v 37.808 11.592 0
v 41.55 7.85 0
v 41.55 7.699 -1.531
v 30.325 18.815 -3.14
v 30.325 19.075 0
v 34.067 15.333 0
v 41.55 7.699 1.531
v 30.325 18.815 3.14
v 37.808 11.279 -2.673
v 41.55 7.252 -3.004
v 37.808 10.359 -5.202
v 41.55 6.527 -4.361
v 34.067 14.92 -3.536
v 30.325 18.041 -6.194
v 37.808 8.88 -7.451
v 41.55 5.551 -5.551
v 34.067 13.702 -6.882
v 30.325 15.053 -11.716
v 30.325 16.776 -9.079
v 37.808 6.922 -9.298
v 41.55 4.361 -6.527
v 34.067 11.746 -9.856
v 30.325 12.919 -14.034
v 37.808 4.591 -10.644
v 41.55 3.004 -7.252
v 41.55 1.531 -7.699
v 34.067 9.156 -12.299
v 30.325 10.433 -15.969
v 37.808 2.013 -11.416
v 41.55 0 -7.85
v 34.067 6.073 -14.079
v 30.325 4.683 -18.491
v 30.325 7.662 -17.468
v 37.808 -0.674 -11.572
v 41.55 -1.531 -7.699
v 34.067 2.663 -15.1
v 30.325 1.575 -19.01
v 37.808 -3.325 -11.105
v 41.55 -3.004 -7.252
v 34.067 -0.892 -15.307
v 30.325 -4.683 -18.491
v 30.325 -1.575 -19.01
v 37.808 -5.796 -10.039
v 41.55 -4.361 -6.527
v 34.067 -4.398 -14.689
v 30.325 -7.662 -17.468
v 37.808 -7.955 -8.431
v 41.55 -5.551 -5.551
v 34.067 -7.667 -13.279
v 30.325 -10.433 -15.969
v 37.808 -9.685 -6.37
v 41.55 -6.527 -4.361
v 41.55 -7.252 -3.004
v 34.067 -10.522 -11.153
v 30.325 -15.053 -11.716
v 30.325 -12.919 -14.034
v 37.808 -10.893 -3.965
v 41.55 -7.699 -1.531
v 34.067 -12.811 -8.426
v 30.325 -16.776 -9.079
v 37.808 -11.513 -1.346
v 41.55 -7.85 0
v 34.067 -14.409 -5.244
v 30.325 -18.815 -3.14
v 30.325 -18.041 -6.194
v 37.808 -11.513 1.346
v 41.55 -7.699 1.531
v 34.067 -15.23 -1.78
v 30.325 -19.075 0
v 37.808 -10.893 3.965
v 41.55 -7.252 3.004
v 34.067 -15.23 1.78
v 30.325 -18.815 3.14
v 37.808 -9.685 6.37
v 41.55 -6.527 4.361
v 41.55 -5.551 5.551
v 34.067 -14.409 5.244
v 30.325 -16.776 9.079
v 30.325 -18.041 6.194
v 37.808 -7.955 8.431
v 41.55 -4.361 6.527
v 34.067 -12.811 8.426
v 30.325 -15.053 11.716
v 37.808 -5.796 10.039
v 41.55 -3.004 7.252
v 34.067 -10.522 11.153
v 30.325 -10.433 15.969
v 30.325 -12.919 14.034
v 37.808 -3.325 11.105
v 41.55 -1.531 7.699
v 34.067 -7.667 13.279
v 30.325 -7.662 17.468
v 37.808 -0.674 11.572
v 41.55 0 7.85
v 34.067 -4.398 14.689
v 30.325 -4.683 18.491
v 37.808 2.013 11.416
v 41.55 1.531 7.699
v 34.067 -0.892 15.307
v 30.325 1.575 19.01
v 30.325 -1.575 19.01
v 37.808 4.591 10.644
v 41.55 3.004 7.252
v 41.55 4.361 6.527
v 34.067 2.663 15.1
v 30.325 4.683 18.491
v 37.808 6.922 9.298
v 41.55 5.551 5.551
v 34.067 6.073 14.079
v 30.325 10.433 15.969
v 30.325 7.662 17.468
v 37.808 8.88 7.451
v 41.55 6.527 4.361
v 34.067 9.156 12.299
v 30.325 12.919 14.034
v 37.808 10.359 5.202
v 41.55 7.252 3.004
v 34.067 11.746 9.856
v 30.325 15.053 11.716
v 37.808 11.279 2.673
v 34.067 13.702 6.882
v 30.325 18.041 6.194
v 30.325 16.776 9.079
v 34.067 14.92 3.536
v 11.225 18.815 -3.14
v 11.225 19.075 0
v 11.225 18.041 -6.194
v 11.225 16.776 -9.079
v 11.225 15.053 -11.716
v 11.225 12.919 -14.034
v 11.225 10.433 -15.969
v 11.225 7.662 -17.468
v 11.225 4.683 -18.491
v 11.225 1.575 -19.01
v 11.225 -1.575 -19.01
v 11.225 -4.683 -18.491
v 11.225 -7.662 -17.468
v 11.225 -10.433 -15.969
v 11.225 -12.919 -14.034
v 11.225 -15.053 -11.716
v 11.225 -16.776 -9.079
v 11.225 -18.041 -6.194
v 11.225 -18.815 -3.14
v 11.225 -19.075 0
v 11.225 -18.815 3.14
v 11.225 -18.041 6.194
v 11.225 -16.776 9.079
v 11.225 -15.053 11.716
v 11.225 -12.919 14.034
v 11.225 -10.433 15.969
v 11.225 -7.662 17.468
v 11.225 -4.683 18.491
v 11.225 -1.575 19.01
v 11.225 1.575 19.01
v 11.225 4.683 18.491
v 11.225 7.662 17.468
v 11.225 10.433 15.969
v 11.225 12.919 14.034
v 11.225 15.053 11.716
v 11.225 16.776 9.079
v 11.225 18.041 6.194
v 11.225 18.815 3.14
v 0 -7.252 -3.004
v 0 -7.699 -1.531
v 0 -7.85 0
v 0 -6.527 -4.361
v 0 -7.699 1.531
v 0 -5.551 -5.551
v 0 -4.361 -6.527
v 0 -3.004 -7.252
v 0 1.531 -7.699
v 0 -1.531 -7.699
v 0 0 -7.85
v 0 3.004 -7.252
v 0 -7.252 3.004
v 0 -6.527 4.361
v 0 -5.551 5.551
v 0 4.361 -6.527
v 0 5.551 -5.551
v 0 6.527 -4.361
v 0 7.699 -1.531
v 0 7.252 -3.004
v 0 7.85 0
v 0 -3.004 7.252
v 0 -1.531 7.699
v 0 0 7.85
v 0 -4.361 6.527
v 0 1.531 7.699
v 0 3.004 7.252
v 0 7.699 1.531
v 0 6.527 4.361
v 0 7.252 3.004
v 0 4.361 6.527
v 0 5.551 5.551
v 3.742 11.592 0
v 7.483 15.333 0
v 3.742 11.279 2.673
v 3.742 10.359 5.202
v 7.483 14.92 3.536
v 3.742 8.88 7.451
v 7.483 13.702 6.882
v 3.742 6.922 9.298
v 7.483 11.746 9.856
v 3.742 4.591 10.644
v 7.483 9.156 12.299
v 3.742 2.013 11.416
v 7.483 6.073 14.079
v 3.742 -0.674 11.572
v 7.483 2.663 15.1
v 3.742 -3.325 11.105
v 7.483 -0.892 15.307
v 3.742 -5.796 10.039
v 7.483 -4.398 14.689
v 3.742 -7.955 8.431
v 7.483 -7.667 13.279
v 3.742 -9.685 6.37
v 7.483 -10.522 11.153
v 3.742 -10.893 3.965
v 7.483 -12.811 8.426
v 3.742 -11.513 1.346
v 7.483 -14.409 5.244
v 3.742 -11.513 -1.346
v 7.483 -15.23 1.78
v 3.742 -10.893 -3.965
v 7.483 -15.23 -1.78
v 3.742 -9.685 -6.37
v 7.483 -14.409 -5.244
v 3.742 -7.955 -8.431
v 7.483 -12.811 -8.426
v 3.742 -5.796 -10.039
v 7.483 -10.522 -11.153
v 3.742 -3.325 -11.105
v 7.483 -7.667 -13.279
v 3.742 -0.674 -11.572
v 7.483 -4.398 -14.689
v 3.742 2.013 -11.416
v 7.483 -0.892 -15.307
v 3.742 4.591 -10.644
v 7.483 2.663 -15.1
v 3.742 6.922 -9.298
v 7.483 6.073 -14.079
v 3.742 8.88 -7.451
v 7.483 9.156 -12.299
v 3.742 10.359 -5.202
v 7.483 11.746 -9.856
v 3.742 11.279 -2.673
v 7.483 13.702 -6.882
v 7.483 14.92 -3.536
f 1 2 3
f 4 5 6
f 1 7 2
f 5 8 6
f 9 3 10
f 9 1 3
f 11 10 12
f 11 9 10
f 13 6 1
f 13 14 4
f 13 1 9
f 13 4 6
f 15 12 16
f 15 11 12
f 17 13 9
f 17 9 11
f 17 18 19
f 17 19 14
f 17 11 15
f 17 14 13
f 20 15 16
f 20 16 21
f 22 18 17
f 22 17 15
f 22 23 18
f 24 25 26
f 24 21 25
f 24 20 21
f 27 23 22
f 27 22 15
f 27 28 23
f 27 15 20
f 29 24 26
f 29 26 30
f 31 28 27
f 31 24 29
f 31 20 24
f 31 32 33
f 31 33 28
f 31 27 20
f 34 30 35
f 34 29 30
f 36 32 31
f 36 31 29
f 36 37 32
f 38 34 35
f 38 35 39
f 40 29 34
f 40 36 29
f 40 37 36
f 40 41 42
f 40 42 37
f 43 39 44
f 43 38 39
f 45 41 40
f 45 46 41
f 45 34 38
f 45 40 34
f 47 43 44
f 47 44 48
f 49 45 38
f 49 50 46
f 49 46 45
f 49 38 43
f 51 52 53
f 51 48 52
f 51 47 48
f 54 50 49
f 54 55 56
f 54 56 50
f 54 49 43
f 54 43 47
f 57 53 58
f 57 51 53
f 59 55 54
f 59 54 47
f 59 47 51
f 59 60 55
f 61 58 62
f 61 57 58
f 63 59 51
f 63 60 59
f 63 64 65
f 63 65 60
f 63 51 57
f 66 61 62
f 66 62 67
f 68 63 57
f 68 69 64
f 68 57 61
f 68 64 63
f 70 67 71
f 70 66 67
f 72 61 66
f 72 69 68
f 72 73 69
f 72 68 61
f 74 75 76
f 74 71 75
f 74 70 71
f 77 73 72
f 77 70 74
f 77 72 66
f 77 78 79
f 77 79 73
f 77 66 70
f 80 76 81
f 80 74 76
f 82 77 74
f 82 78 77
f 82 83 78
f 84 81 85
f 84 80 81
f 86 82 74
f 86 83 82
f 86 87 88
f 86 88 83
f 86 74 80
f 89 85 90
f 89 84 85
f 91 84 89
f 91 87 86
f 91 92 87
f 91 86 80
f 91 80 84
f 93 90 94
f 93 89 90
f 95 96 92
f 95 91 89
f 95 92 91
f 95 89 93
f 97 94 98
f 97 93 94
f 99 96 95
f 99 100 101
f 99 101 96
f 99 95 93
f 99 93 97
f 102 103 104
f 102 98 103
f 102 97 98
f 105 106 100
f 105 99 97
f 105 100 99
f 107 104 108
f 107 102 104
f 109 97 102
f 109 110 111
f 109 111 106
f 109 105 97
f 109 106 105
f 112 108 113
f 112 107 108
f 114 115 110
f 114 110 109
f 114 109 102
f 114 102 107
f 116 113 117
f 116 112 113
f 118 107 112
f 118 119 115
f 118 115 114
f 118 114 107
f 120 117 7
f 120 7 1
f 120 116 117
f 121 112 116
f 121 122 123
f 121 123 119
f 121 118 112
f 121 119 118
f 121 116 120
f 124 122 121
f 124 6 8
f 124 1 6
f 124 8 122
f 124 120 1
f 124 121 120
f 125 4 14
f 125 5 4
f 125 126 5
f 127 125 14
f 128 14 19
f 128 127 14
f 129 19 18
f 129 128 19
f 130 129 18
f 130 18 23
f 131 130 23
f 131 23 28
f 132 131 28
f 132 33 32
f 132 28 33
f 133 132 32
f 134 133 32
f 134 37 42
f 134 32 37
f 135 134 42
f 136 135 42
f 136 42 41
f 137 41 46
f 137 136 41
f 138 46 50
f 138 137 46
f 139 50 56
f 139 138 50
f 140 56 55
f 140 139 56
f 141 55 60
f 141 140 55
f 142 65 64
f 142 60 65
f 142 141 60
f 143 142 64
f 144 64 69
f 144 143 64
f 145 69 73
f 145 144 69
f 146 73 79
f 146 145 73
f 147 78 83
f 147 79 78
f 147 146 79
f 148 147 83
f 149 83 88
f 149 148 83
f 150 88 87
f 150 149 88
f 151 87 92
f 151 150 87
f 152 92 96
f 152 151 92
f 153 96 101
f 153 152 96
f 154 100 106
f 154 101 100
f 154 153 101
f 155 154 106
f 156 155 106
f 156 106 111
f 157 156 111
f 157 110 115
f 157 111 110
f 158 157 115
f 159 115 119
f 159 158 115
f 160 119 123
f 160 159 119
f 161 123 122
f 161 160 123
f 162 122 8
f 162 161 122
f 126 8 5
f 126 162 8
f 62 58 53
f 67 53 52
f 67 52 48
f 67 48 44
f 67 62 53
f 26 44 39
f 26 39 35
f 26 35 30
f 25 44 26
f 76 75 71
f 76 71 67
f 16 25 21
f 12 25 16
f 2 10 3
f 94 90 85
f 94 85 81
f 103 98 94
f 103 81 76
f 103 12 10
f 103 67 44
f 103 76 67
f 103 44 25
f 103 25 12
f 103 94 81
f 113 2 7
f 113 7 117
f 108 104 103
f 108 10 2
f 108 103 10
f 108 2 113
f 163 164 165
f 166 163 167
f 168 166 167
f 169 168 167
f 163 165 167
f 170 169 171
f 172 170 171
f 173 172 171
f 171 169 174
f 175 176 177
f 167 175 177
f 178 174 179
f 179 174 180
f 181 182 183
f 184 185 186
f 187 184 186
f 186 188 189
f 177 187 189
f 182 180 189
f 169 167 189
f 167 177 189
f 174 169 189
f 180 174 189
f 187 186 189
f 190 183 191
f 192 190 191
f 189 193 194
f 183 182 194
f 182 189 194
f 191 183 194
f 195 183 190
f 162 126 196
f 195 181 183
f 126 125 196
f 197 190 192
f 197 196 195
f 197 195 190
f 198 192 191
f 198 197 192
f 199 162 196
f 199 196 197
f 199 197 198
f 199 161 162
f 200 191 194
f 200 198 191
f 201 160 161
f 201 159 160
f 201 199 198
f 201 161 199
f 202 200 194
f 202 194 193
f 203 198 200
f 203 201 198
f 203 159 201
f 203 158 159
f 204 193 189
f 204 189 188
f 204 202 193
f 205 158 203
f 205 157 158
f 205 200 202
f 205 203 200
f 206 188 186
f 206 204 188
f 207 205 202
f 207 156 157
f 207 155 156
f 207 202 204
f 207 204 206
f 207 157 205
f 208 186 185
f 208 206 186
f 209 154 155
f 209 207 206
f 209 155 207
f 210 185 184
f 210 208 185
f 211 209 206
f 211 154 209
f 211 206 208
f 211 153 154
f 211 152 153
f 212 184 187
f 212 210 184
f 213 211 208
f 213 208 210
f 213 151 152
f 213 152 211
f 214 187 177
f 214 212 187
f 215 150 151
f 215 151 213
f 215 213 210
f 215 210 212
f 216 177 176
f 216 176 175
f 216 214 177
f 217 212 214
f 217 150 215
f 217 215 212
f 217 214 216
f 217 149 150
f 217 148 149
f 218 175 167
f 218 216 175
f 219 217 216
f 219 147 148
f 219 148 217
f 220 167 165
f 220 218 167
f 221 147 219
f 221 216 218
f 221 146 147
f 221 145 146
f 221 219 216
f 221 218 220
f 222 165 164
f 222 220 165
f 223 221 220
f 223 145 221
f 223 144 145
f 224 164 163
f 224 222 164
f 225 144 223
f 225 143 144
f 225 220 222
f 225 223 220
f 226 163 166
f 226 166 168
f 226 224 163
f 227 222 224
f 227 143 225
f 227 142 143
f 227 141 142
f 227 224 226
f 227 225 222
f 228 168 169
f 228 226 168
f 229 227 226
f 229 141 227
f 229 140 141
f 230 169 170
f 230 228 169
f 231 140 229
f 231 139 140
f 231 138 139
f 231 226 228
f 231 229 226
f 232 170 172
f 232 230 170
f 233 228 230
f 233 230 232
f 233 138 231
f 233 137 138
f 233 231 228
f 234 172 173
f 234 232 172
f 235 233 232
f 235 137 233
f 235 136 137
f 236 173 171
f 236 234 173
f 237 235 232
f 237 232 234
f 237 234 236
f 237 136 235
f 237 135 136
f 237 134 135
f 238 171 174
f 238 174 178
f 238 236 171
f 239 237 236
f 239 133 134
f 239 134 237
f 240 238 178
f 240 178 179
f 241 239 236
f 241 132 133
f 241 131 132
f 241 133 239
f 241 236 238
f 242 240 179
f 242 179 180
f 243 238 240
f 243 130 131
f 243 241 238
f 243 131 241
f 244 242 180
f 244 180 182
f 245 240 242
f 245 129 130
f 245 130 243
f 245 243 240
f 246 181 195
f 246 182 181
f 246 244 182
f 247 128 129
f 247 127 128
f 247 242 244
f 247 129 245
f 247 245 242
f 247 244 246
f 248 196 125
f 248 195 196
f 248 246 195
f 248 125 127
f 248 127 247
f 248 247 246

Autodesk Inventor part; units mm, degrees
ref_plane "XZ Plane" through (0, 0, 0) normal (0, 1, 0) x (-1, 0, 0)
ref_plane "XY Plane" through (0, 0, 0) normal (0, 0, 1) x (1, 0, 0)
sketch "Boceto1" plane through (0, 0, 0) normal (1, 0, 0) x (0, 1, 0)
  circle A0 centre (0, 0) radius 7.85
  dimension "d0" = 15.7
ref_plane "Plano de trabajo1" through (11.225, 0, 0) normal (1, 0, 0) x (0, 1, 0)
sketch "Boceto2" plane through (11.225, 0, 0) normal (1, 0, 0) x (0, 1, 0)
  circle A0 centre (0, 0) radius 19.075
  dimension "d2" = 38.15
ref_plane "Plano de trabajo2" through (30.325, 0, 0) normal (1, 0, 0) x (0, 1, 0)
sketch "Boceto3" plane through (30.325, 0, 0) normal (1, 0, 0) x (0, 1, 0)
  point P0 (0, 0)
ref_plane "Plano de trabajo3" through (41.55, 0, 0) normal (1, 0, 0) x (0, 1, 0)
sketch "Boceto4" plane through (41.55, 0, 0) normal (1, 0, 0) x (0, 1, 0)
  circle A0 centre (0, 0) radius 7.85
  dimension "d6" = 15.7
extrude "Extrusión1" add sketch "Boceto2" along normal blind 19.1
extrude "Extrusión2" add sketch "Boceto1" along normal blind 15
extrude "Extrusión3" add sketch "Boceto4" against normal blind 15
loft "Solevación1" add section 1 edges at (41.55, -7.85, 0) section 2 edges at (30.325, -19.075, 0)
loft "Solevación2" add section 1 edges at (0, -7.85, 0) section 2 edges at (11.225, -19.075, 0)
properties part number "PESAS BAILARINA"
